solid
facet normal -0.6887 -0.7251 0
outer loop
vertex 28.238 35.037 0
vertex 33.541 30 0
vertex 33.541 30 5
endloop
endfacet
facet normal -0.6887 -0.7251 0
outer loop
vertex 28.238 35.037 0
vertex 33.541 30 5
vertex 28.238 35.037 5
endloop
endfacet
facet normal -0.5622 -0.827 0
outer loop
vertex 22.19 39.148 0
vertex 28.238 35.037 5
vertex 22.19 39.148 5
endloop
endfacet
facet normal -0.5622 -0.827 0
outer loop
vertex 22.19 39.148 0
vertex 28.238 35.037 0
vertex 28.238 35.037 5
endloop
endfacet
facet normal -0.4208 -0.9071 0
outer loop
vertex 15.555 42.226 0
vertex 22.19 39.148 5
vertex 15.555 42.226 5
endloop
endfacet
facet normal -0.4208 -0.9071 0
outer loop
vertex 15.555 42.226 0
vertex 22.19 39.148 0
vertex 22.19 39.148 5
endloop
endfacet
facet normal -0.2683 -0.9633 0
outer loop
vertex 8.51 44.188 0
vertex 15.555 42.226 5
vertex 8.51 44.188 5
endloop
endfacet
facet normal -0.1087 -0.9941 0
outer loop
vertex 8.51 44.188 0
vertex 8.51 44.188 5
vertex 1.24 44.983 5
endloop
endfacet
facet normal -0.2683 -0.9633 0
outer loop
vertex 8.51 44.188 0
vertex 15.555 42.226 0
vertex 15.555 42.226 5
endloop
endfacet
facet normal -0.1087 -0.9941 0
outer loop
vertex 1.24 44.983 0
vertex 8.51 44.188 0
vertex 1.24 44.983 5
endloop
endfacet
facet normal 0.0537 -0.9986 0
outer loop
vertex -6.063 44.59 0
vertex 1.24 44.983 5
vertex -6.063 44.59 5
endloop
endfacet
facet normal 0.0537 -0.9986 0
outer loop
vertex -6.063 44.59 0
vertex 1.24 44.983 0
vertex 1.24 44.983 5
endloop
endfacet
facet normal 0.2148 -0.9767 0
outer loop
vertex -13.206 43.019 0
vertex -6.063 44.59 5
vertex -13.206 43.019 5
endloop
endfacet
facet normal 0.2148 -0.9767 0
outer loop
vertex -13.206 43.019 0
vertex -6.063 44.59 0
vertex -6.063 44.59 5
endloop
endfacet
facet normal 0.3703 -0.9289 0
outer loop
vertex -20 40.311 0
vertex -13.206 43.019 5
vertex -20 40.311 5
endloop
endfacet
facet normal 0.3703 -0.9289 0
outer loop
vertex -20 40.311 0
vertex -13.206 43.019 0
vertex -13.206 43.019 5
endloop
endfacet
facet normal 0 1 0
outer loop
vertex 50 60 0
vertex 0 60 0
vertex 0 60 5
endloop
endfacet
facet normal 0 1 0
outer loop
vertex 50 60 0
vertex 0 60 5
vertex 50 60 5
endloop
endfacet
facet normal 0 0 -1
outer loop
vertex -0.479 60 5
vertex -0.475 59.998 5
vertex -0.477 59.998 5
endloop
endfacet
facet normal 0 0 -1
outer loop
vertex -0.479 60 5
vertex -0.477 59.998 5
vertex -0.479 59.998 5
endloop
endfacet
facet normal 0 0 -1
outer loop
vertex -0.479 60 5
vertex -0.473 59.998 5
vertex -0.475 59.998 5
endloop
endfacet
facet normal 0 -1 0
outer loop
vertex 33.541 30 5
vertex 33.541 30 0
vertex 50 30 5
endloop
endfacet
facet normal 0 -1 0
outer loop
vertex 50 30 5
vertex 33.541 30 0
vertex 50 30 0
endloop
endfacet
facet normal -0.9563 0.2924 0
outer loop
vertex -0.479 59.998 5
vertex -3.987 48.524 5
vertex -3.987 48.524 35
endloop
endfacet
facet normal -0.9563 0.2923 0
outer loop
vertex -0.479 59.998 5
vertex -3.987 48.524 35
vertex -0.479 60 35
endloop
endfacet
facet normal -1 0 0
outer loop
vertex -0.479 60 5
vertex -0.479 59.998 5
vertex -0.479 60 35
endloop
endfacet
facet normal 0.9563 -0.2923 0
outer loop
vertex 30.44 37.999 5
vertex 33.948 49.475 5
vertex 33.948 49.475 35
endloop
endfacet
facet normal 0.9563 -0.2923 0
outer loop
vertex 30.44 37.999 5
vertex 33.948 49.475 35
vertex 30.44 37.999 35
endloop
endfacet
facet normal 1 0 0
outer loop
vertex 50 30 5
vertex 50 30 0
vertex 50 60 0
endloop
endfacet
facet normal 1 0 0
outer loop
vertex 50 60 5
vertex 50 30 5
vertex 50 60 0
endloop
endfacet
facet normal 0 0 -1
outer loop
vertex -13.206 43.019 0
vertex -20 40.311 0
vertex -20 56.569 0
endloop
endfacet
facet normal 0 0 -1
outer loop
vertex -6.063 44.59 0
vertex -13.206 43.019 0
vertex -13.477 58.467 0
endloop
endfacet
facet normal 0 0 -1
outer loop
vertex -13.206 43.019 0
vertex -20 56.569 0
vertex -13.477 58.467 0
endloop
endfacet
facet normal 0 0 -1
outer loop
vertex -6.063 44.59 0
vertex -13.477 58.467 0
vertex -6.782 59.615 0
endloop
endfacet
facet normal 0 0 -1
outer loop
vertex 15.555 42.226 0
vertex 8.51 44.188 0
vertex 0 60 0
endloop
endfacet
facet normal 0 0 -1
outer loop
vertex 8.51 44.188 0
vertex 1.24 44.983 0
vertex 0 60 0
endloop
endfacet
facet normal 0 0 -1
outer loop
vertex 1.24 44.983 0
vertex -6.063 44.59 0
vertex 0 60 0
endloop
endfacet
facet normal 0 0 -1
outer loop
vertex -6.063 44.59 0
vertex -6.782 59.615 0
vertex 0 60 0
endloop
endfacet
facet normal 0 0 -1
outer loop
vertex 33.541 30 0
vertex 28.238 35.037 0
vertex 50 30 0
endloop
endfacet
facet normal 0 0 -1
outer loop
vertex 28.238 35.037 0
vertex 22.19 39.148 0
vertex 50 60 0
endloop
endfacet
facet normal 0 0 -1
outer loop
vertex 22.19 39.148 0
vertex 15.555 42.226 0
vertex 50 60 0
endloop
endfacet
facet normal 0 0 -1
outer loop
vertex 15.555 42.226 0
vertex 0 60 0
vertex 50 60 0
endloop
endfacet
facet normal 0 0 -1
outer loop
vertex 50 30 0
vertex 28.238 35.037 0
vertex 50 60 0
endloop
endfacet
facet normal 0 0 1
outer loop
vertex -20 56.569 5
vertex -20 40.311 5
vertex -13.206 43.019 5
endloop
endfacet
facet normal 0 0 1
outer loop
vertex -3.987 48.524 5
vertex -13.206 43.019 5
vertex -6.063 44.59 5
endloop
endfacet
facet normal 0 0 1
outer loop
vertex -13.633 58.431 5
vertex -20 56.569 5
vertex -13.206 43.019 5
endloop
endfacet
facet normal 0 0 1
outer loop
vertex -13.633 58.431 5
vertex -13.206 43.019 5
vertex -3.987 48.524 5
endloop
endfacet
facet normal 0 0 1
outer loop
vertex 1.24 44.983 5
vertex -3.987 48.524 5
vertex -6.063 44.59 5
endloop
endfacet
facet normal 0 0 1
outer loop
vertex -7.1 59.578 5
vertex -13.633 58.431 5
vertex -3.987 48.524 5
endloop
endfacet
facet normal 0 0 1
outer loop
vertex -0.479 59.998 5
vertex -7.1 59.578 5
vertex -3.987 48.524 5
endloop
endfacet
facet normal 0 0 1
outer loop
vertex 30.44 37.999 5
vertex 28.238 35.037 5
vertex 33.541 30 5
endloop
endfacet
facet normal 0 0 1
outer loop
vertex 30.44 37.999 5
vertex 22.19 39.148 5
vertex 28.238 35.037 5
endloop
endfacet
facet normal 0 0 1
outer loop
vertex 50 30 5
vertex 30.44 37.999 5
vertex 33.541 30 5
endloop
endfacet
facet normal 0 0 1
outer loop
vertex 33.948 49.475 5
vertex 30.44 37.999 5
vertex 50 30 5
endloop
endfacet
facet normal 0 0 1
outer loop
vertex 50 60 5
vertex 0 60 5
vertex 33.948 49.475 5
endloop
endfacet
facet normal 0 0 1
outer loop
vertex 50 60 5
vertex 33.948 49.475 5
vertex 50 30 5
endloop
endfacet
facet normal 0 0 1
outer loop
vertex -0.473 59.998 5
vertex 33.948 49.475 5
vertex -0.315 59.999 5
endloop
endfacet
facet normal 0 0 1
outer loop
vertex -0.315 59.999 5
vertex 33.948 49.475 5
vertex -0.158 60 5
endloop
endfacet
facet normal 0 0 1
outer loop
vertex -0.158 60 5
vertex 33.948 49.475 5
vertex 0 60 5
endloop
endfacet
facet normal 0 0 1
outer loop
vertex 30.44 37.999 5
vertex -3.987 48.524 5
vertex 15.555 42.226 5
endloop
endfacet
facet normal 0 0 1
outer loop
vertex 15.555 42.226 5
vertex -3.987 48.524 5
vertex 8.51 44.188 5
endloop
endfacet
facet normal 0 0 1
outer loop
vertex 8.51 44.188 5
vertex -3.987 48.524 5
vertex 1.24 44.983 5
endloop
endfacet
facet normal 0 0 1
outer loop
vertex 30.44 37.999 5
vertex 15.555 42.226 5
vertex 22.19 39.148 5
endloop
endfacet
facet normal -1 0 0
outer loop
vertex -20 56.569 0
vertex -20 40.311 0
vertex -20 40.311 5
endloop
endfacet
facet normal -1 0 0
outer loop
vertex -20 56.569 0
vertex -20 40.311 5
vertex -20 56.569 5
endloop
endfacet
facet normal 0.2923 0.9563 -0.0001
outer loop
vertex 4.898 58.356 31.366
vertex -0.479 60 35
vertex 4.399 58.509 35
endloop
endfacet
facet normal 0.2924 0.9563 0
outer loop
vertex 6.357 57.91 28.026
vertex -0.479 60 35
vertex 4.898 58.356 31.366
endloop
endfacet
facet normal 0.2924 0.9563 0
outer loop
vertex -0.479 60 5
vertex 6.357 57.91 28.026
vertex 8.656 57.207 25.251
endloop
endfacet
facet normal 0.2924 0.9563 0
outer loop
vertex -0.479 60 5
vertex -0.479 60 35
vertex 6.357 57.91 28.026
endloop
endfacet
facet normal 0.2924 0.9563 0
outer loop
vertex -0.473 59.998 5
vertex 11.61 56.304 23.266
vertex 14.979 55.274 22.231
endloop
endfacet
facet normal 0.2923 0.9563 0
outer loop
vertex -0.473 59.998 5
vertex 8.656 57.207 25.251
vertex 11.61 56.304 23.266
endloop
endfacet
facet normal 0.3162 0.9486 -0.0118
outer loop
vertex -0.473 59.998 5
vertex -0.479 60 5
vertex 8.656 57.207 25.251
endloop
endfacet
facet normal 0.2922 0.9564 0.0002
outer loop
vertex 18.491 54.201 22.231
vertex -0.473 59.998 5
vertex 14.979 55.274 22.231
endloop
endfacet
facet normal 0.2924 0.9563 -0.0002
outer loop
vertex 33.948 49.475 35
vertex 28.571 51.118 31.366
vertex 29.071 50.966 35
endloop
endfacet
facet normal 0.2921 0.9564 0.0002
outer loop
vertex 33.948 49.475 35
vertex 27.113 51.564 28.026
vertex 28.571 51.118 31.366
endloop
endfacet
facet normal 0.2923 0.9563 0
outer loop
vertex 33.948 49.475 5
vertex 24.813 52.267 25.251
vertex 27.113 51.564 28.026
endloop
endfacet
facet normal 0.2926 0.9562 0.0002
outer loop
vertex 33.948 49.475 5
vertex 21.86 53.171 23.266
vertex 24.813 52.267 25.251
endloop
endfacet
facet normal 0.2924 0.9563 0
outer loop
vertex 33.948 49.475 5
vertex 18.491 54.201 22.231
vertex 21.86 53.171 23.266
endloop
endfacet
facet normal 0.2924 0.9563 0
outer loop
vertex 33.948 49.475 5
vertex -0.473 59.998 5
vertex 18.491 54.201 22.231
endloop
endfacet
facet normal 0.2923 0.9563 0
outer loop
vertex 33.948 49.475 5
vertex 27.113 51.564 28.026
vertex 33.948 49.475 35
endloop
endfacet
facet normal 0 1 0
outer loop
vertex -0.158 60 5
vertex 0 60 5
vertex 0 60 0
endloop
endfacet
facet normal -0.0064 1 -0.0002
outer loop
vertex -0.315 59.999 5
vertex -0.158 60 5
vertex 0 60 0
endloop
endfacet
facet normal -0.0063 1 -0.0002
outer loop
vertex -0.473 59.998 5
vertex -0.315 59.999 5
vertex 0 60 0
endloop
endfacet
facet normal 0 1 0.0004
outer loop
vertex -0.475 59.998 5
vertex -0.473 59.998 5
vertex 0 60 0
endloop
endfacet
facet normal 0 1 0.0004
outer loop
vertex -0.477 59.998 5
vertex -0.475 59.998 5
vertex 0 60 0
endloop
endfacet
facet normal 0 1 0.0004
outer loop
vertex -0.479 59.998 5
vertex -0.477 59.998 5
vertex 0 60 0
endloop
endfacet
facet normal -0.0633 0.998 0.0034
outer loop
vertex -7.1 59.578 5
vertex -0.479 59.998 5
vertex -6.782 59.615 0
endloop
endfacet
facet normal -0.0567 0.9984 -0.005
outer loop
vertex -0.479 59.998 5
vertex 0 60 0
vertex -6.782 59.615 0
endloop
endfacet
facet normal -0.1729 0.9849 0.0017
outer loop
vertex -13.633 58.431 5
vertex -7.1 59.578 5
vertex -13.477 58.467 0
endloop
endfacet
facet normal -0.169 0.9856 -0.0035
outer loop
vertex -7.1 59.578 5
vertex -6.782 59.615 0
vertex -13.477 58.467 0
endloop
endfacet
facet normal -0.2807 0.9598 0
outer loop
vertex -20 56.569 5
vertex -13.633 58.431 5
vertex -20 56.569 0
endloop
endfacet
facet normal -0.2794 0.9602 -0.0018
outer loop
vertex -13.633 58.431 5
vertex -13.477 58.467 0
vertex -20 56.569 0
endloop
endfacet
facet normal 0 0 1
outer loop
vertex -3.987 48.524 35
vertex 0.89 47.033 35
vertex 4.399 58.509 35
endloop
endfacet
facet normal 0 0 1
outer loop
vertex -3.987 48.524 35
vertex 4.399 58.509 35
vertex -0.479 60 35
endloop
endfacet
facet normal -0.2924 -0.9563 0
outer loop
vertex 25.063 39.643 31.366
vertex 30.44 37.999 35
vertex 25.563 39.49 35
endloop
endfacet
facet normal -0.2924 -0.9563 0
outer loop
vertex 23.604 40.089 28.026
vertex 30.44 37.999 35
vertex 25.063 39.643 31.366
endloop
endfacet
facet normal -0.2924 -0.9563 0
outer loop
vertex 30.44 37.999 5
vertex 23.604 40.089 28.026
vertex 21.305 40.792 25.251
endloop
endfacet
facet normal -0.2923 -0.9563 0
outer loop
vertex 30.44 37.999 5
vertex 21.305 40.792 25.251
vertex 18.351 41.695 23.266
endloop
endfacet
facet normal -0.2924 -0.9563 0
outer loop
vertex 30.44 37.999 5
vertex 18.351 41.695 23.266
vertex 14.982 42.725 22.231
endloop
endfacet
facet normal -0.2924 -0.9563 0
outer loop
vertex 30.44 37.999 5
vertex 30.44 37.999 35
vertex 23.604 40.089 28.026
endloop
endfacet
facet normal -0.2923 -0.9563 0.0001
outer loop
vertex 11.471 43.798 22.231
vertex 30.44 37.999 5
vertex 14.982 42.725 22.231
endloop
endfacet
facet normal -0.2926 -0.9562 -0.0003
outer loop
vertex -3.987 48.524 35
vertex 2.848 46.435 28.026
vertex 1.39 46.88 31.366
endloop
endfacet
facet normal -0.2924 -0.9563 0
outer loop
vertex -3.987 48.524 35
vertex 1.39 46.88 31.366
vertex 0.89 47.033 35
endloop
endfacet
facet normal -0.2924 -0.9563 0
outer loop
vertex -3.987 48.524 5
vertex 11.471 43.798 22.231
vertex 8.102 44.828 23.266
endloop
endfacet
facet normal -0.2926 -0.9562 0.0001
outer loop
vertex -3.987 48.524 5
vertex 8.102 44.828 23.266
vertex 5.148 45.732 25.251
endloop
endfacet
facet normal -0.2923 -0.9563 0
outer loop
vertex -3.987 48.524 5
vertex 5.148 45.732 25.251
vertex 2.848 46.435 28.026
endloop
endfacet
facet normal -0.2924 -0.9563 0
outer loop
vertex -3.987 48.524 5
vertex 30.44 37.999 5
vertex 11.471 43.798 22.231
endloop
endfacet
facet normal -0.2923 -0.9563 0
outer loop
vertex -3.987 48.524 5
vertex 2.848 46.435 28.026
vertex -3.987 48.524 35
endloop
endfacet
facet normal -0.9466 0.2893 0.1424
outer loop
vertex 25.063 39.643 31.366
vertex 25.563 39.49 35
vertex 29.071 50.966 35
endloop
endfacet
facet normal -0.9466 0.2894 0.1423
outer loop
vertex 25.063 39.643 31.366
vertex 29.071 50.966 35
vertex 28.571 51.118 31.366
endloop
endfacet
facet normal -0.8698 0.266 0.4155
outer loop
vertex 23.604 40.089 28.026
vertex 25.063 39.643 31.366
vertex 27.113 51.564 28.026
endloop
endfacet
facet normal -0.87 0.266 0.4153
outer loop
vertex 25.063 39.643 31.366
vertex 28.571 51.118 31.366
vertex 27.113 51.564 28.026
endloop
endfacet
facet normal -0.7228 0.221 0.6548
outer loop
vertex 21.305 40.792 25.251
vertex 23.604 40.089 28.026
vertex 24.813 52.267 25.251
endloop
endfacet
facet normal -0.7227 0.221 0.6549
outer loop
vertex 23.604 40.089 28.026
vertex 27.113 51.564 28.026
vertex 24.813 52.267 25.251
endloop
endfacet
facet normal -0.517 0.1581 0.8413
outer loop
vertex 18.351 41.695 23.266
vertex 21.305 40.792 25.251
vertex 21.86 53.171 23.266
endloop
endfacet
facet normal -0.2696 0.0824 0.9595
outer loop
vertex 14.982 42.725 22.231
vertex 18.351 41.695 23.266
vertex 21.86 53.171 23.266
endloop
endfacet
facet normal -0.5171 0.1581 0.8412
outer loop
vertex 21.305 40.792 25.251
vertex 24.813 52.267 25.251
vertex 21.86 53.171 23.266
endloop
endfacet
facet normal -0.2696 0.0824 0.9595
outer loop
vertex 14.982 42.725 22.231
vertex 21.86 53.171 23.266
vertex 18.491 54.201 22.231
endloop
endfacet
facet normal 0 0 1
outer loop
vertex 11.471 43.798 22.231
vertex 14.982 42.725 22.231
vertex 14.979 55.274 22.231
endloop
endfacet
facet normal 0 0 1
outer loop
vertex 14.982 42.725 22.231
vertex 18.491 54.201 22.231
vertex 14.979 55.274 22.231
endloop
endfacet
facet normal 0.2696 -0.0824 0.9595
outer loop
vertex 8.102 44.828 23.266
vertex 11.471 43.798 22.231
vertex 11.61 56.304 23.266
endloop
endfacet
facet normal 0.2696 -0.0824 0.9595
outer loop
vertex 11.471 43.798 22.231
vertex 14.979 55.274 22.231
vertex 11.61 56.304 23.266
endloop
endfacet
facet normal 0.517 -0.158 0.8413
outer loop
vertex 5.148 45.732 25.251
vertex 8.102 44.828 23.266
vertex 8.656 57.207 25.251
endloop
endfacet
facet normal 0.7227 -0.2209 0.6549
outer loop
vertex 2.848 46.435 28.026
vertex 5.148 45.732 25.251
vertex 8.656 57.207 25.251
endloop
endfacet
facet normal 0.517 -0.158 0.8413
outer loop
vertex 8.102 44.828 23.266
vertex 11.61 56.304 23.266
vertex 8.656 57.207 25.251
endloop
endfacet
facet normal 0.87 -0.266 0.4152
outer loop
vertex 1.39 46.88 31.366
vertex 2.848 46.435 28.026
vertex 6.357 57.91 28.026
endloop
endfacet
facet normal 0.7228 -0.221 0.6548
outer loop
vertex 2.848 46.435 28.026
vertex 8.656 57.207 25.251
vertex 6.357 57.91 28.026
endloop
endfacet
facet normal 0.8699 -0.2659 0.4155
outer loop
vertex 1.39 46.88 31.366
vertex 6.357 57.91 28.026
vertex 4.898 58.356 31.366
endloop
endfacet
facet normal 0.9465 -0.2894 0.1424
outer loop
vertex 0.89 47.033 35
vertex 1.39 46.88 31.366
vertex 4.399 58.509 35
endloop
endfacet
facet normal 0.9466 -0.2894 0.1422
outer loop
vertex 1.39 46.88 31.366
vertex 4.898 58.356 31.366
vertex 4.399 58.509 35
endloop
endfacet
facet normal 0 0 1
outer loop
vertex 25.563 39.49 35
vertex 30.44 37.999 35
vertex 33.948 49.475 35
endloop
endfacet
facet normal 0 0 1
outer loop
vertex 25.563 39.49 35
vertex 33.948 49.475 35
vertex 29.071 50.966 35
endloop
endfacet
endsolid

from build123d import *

# Parameters (mm, degrees)
PAD_DEPTH    = 5
PAD001_DEPTH = 30
SKETCH002_R  = 12.9
POCKET_DEPTH = 34.3976445385


with BuildPart() as part:
    # Sketch → Pad (new body)
    with BuildSketch(Plane.XY):
        with BuildLine():
            Line((33.5410196625, 30), (50, 30))
            Line((50, 30), (50, 60))
            Line((0, 60), (50, 60))
            ThreePointArc((0, 60), (-10.1461187235, 59.1359135792), (-20, 56.5685424949))
            Line((-20, 40.3112887415), (-20, 56.5685424949))
            ThreePointArc((33.5410196625, 30), (8.5100218715, 44.1880020792), (-20, 40.3112887415))
        make_face()
    extrude(amount=PAD_DEPTH)

    # Sketch001 → Pad001 (new body)
    with BuildSketch(Plane.XY.offset(5)):
        Polygon((-0.4786107292, 60), (33.9483604854, 49.47461863), (30.4399000287, 37.9989615584), (-3.9870711859, 48.5243429284), align=None)
    extrude(amount=PAD001_DEPTH)

    # Sketch002 → Pocket (cut, through all)
    with BuildSketch(Plane(origin=(16.7348748781, 54.737309315, 0), x_dir=(-0.956304756, 0.2923717047, 0), z_dir=(0.2923717047, 0.956304756, 0))):
        with Locations((0, 35)):
            Circle(SKETCH002_R)
    extrude(amount=-POCKET_DEPTH, mode=Mode.SUBTRACT)


solid = part.part
